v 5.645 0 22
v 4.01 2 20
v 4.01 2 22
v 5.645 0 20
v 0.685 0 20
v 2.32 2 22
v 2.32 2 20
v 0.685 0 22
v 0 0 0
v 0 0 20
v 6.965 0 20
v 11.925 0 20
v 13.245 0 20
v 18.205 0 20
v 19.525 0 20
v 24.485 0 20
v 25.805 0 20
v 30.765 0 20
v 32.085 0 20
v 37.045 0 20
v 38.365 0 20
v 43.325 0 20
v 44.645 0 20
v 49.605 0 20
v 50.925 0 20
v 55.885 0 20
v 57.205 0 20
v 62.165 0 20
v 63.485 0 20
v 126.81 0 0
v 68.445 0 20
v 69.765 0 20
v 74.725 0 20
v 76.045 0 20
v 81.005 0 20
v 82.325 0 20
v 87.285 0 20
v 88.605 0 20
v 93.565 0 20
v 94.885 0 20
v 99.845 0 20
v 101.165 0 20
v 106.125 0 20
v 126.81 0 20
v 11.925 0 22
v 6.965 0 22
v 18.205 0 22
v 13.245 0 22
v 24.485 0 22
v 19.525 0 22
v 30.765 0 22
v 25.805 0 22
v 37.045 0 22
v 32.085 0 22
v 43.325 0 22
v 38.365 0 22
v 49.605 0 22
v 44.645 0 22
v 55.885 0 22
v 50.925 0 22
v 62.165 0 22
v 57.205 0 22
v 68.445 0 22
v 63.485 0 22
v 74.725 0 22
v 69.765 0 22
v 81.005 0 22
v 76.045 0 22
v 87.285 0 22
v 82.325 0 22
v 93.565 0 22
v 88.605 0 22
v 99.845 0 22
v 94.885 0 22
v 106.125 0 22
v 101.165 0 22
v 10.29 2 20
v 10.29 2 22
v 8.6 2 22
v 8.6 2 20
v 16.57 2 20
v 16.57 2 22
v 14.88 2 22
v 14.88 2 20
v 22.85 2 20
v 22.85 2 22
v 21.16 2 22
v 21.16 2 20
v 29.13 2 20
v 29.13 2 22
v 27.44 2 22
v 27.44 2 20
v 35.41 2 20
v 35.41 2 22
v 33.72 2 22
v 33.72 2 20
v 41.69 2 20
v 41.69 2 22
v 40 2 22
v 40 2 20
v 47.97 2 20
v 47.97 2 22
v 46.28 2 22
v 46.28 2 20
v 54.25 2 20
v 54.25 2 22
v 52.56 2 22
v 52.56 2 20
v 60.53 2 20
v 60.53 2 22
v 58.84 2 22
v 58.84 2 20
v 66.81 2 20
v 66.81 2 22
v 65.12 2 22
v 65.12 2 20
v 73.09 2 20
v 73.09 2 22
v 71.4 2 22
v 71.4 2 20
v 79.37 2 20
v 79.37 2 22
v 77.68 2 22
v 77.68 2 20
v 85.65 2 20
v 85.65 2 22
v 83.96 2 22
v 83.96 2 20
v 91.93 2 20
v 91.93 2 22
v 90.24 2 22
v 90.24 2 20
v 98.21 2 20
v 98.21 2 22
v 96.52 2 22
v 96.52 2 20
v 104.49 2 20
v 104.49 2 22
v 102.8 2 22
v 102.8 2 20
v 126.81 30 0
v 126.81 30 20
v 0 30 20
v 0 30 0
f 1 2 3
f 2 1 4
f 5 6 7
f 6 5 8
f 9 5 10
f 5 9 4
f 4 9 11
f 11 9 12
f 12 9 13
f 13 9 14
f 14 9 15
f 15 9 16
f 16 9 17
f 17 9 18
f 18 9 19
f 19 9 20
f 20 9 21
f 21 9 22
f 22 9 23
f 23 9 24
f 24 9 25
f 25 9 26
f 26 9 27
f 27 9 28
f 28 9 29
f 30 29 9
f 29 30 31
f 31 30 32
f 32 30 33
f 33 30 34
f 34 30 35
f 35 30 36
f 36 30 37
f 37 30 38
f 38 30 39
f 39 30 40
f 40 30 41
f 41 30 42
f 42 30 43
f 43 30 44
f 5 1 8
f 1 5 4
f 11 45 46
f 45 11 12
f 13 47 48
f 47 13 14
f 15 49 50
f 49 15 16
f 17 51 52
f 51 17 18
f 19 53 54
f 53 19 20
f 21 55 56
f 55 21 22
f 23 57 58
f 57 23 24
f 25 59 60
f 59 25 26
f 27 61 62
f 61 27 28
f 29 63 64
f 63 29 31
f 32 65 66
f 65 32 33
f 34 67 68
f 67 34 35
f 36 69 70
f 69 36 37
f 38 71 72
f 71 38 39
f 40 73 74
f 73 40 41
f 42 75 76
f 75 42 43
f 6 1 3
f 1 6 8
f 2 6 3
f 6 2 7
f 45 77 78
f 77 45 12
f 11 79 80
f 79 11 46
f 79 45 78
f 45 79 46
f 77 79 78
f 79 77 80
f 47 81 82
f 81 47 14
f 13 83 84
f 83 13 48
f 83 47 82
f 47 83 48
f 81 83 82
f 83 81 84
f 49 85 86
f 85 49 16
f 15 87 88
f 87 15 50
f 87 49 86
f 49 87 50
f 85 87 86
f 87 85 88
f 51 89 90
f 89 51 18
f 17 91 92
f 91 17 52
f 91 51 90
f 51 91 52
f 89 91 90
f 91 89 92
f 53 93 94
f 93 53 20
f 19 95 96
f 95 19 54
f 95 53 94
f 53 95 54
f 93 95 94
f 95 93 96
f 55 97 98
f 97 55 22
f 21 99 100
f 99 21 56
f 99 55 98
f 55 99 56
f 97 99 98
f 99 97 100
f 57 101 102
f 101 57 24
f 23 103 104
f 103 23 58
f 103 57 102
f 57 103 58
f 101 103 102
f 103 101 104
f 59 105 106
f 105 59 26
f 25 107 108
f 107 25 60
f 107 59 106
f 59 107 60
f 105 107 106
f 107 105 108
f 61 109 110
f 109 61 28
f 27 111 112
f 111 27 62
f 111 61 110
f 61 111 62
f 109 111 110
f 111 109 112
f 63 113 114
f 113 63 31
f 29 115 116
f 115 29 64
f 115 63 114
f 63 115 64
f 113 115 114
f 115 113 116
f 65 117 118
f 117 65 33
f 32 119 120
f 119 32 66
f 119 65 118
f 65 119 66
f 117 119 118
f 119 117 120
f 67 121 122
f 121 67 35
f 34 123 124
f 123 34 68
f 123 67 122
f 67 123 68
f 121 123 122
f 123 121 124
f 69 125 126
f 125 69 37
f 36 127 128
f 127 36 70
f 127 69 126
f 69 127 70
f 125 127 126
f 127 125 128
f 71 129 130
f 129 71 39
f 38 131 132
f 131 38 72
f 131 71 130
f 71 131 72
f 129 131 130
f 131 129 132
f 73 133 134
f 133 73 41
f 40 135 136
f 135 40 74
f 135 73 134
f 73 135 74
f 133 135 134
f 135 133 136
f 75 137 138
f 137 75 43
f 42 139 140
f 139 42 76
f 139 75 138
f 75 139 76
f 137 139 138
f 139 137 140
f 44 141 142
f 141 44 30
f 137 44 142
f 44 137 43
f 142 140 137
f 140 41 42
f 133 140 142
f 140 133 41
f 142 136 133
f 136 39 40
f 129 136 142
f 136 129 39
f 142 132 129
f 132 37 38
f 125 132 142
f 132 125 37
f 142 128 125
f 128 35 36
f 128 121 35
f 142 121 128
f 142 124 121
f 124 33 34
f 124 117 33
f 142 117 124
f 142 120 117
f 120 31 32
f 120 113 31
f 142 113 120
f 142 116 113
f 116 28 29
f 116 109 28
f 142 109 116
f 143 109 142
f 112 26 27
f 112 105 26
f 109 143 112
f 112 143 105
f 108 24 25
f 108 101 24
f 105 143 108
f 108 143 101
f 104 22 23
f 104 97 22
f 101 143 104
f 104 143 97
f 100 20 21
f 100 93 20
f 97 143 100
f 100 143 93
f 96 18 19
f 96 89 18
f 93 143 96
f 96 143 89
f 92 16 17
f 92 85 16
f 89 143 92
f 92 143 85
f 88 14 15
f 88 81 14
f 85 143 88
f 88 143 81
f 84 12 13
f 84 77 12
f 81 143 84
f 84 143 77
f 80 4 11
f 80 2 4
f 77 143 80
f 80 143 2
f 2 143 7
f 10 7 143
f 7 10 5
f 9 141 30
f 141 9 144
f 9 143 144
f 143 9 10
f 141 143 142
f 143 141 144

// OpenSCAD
$fn = 32;

// ----------------------------------------------------------------------
// Gear rack: m=2 z=17, 126.81 x 30 x 22 mm
// ----------------------------------------------------------------------

// --- parameters (mm) ---
bar_len = 126.81;         // rack length, X
bar_w = 30;               // rack width, Y
bar_h = 22;               // overall height, Z
gear_module = 2;          // module
base_t = 20;              // tooth root line height
pitch = 6.28;             // circular pitch
tip_w = 1.69;             // tooth thickness at the tip
root_w = 4.96;            // tooth thickness at the root line
sink = 0.6;               // tooth root overlap into the body

tooth_span = 106.81;

module tooth(x0) {
  /* 20 deg flank profile, sunk into the body for a positive overlap */
  translate([x0, 0, base_t - sink])
    linear_extrude(height = bar_h - base_t + sink)
      polygon(points = [[-root_w / 2, 0], [root_w / 2, 0],
                        [tip_w / 2, bar_h - base_t],
                        [-tip_w / 2, bar_h - base_t]]);
}

difference() {
  union() {
    cube([bar_len, bar_w, base_t]);
    for (i = [0 : 17 - 1])
      tooth((i + 0.5) * pitch + (tooth_span - 17 * pitch) / 2);
  }
}
